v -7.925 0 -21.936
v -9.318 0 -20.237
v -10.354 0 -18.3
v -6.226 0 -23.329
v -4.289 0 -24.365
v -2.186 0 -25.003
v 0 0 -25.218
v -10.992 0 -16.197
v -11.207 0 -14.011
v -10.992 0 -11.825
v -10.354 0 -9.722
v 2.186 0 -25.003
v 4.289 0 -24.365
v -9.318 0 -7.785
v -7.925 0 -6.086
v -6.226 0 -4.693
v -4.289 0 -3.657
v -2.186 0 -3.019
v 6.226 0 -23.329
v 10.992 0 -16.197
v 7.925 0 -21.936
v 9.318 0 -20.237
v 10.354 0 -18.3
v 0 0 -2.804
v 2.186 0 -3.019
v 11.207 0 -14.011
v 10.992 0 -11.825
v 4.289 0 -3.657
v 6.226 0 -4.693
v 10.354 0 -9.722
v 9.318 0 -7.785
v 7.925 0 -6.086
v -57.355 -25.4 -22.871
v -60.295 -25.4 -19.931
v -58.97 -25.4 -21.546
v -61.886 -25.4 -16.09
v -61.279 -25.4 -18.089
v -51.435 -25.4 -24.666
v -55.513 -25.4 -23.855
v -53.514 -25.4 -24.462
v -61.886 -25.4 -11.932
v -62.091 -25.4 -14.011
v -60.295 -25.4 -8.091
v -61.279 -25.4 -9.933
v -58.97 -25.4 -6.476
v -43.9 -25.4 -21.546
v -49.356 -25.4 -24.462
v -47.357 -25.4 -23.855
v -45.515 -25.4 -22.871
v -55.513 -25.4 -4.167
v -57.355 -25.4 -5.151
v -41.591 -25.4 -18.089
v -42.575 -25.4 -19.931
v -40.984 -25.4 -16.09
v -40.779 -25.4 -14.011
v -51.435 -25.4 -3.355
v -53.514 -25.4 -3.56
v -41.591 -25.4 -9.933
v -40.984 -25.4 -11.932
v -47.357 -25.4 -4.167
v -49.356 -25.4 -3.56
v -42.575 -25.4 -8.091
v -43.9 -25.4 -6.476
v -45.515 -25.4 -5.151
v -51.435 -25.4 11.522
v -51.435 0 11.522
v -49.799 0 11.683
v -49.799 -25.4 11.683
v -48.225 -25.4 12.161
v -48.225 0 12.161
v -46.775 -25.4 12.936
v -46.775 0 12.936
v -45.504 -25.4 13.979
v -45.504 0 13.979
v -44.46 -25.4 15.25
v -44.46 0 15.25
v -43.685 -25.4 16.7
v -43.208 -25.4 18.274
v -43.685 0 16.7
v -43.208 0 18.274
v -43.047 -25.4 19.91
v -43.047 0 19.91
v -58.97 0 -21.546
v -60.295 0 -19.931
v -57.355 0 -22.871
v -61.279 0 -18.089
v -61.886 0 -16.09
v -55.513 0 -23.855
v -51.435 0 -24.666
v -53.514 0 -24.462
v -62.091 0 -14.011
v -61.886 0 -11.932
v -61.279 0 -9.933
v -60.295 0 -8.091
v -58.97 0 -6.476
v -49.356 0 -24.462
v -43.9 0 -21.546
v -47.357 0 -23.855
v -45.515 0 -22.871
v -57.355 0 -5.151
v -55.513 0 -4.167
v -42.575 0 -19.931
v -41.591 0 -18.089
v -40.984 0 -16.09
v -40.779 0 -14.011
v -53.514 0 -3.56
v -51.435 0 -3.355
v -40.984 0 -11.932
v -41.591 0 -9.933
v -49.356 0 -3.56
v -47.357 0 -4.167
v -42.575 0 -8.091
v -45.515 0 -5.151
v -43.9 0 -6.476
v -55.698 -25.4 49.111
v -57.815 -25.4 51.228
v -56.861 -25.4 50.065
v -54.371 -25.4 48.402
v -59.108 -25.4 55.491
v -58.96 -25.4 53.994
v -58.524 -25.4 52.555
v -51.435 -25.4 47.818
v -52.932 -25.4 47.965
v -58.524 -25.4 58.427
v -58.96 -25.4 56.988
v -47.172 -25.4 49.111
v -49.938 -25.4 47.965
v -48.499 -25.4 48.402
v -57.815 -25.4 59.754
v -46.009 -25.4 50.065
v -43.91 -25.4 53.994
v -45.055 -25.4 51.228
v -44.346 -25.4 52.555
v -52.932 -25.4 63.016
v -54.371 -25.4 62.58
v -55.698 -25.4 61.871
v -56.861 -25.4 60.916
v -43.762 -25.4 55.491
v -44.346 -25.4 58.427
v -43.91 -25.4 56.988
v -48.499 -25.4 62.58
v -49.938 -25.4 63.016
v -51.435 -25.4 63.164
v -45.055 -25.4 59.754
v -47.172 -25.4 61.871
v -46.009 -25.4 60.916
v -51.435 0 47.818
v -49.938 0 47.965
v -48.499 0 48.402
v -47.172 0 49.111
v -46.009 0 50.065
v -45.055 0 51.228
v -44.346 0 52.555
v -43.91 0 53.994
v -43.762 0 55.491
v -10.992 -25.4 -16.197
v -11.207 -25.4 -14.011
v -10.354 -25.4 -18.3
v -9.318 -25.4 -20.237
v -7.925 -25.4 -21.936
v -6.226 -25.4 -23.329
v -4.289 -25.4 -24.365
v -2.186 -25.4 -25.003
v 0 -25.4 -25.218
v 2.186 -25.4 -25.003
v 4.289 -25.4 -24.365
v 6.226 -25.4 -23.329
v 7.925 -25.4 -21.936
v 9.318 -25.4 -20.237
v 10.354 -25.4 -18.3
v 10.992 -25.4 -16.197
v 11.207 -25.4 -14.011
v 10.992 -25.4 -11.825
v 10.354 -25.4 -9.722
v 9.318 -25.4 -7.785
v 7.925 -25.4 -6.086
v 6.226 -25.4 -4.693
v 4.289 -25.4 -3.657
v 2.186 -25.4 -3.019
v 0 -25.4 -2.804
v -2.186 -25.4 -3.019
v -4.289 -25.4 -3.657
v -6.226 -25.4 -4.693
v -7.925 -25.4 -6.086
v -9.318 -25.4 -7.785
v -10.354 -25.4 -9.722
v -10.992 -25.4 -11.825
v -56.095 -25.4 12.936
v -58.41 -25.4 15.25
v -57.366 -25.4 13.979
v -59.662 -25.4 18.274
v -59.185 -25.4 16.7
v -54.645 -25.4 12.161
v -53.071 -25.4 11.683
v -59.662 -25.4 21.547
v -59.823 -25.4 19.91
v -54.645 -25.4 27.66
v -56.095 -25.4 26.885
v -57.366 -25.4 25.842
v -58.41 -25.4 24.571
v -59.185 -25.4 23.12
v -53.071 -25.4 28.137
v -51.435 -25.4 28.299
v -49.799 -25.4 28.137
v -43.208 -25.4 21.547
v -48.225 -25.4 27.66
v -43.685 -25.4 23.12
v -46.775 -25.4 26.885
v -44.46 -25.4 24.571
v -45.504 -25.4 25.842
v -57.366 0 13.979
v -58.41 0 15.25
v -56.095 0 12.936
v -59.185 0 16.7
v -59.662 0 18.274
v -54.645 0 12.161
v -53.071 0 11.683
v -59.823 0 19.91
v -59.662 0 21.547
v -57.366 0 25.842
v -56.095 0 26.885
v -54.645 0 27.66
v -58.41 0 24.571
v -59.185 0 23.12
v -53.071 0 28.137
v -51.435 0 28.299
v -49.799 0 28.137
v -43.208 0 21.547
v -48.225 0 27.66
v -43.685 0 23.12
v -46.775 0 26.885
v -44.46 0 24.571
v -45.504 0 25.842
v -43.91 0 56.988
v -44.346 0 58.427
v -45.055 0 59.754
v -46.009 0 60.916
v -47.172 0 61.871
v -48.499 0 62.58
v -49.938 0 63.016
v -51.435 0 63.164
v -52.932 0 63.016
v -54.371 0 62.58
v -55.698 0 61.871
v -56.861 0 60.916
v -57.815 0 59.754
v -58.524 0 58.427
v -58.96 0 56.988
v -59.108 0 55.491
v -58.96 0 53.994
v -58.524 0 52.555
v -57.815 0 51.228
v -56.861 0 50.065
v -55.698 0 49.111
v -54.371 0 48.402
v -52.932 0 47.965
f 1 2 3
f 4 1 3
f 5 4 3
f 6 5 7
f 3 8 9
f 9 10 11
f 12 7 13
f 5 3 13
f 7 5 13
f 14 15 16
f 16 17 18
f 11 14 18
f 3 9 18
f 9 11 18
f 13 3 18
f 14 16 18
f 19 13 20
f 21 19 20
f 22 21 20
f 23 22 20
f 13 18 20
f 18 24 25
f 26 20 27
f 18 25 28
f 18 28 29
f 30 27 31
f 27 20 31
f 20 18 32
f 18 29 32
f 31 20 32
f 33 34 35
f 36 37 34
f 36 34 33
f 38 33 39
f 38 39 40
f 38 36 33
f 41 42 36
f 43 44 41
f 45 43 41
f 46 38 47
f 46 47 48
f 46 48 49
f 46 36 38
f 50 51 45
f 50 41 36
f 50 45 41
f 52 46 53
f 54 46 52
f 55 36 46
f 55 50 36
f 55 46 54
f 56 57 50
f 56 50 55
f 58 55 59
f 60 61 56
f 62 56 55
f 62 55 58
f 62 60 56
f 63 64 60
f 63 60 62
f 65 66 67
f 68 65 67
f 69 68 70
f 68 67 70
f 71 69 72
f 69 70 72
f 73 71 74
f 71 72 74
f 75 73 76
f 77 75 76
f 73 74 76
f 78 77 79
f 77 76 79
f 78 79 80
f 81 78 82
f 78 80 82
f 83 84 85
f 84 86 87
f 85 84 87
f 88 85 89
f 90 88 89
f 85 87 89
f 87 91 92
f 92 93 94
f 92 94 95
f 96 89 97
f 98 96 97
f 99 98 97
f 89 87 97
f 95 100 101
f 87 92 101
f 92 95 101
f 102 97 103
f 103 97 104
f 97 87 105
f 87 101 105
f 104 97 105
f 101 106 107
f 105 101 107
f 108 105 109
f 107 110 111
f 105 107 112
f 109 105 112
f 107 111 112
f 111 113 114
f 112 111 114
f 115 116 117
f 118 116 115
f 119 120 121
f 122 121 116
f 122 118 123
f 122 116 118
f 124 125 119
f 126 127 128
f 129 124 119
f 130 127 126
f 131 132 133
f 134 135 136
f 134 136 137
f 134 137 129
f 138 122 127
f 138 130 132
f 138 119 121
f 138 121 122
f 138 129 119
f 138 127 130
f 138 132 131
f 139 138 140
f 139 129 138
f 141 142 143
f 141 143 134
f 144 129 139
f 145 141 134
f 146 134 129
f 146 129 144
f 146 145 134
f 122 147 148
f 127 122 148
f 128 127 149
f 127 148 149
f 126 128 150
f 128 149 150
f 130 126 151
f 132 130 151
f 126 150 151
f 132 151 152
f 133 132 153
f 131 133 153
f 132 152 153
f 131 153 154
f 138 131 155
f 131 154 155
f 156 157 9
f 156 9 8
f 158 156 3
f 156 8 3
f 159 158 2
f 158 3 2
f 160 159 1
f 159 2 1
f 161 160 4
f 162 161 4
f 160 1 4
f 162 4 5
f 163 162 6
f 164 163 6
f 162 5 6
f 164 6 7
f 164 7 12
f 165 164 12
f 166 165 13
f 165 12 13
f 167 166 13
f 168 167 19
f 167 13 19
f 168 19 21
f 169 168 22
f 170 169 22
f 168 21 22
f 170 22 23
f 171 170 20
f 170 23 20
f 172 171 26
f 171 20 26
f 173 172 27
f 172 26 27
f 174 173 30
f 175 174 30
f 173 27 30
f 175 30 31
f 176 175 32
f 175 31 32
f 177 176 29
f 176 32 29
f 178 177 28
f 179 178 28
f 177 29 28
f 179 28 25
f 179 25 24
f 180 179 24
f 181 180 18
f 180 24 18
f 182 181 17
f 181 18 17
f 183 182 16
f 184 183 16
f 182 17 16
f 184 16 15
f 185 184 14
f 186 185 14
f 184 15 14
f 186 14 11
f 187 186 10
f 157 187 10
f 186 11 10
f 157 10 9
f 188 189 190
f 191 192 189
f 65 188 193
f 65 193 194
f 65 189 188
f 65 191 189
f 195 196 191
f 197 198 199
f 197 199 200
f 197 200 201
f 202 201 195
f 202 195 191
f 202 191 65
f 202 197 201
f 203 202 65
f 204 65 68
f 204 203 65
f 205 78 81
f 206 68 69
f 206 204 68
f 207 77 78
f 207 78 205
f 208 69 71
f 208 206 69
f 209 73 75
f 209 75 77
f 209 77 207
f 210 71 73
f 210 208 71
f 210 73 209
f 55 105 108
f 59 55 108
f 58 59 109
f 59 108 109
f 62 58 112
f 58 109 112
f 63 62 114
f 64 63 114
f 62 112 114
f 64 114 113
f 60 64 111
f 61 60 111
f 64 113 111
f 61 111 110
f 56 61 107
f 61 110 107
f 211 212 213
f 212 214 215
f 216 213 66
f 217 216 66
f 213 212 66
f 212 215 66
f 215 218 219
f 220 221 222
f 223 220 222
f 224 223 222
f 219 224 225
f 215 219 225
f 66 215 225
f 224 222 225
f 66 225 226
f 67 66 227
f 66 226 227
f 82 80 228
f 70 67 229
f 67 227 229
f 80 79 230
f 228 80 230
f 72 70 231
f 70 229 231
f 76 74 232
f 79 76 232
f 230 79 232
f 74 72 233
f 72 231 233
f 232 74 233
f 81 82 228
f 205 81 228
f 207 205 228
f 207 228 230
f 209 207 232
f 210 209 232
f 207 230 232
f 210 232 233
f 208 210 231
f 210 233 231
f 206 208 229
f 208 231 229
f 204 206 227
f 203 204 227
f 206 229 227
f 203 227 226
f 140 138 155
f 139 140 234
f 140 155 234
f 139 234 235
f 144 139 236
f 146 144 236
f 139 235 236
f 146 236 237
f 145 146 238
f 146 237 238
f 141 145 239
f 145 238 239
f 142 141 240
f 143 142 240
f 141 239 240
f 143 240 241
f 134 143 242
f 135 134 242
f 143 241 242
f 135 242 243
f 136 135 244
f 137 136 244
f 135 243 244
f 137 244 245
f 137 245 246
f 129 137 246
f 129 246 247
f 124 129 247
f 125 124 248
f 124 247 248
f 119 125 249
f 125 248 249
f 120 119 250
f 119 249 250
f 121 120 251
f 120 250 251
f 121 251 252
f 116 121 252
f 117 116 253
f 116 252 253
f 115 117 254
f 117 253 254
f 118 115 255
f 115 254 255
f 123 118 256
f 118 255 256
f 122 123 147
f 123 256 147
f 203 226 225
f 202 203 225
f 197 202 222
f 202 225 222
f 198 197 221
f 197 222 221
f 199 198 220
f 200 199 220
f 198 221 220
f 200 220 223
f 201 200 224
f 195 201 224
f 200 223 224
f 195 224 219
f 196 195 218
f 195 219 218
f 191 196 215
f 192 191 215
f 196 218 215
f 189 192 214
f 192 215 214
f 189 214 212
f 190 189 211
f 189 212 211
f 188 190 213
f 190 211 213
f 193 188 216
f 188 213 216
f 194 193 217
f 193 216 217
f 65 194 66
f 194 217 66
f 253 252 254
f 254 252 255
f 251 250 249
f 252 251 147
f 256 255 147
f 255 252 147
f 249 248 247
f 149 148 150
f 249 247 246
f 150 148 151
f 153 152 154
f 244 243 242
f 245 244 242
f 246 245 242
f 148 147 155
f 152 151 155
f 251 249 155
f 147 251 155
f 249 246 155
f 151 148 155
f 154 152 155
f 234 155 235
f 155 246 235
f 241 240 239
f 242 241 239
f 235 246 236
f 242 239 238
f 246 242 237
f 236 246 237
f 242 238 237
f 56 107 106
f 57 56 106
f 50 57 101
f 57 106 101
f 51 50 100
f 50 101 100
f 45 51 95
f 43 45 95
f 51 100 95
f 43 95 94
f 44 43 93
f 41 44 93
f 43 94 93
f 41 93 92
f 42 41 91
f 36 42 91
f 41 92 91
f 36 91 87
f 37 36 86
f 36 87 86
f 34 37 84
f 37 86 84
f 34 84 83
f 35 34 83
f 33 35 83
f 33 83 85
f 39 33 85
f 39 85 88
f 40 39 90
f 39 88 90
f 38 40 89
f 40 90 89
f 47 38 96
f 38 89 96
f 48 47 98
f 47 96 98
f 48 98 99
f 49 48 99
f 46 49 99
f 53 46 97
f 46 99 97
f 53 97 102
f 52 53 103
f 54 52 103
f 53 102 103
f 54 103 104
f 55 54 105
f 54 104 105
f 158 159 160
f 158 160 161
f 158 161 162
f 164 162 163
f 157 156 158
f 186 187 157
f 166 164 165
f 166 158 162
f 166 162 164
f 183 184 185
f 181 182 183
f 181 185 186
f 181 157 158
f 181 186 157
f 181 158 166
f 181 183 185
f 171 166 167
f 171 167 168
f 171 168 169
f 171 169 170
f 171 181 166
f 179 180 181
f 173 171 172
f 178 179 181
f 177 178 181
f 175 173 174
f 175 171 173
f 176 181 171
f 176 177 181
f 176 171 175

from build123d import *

# Parameters (mm, degrees)
F1_DEPTH = 25.4


with BuildPart() as f1:
    # F0 (on Front) → F1 (new body)
    with BuildSketch(Plane.XZ):
        with BuildLine():
            ThreePointArc((11.207146, -14.010969), (0, -2.803823), (-11.207146, -14.010969))
            ThreePointArc((-11.207146, -14.010969), (0, -25.218115), (11.207146, -14.010969))
        make_face()
        with BuildLine():
            ThreePointArc((-40.779477, -14.010969), (-43.900408, -6.476375), (-51.435001, -3.355445))
            Line((-51.435001, -3.355445), (-51.435001, -14.010969))
            Line((-51.435001, -14.010969), (-40.779477, -14.010969))
        make_face()
        with BuildLine():
            Line((-51.435001, -14.010969), (-51.435001, -3.355445))
            ThreePointArc((-51.435001, -3.355445), (-58.969595, -21.545562), (-40.779477, -14.010969))
            Line((-40.779477, -14.010969), (-51.435001, -14.010969))
        make_face()
        with BuildLine():
            ThreePointArc((-43.046736, 19.910323), (-45.503602, 25.841721), (-51.435001, 28.298587))
            Line((-51.435001, 28.298587), (-51.435001, 19.910323))
            Line((-51.435001, 19.910323), (-51.435001, 11.522058))
            ThreePointArc((-51.435001, 11.522058), (-45.503602, 13.978924), (-43.046736, 19.910323))
        make_face()
        with BuildLine():
            Line((-51.435001, 19.910323), (-51.435001, 28.298587))
            ThreePointArc((-51.435001, 28.298587), (-59.823266, 19.910323), (-51.435001, 11.522058))
            Line((-51.435001, 11.522058), (-51.435001, 19.910323))
        make_face()
        with BuildLine():
            ThreePointArc((-43.762124, 55.490807), (-56.860545, 60.91635), (-51.435001, 47.81793))
            ThreePointArc((-51.435001, 47.81793), (-46.009458, 50.065263), (-43.762124, 55.490807))
        make_face()
    extrude(amount=F1_DEPTH)


solid = f1.part
